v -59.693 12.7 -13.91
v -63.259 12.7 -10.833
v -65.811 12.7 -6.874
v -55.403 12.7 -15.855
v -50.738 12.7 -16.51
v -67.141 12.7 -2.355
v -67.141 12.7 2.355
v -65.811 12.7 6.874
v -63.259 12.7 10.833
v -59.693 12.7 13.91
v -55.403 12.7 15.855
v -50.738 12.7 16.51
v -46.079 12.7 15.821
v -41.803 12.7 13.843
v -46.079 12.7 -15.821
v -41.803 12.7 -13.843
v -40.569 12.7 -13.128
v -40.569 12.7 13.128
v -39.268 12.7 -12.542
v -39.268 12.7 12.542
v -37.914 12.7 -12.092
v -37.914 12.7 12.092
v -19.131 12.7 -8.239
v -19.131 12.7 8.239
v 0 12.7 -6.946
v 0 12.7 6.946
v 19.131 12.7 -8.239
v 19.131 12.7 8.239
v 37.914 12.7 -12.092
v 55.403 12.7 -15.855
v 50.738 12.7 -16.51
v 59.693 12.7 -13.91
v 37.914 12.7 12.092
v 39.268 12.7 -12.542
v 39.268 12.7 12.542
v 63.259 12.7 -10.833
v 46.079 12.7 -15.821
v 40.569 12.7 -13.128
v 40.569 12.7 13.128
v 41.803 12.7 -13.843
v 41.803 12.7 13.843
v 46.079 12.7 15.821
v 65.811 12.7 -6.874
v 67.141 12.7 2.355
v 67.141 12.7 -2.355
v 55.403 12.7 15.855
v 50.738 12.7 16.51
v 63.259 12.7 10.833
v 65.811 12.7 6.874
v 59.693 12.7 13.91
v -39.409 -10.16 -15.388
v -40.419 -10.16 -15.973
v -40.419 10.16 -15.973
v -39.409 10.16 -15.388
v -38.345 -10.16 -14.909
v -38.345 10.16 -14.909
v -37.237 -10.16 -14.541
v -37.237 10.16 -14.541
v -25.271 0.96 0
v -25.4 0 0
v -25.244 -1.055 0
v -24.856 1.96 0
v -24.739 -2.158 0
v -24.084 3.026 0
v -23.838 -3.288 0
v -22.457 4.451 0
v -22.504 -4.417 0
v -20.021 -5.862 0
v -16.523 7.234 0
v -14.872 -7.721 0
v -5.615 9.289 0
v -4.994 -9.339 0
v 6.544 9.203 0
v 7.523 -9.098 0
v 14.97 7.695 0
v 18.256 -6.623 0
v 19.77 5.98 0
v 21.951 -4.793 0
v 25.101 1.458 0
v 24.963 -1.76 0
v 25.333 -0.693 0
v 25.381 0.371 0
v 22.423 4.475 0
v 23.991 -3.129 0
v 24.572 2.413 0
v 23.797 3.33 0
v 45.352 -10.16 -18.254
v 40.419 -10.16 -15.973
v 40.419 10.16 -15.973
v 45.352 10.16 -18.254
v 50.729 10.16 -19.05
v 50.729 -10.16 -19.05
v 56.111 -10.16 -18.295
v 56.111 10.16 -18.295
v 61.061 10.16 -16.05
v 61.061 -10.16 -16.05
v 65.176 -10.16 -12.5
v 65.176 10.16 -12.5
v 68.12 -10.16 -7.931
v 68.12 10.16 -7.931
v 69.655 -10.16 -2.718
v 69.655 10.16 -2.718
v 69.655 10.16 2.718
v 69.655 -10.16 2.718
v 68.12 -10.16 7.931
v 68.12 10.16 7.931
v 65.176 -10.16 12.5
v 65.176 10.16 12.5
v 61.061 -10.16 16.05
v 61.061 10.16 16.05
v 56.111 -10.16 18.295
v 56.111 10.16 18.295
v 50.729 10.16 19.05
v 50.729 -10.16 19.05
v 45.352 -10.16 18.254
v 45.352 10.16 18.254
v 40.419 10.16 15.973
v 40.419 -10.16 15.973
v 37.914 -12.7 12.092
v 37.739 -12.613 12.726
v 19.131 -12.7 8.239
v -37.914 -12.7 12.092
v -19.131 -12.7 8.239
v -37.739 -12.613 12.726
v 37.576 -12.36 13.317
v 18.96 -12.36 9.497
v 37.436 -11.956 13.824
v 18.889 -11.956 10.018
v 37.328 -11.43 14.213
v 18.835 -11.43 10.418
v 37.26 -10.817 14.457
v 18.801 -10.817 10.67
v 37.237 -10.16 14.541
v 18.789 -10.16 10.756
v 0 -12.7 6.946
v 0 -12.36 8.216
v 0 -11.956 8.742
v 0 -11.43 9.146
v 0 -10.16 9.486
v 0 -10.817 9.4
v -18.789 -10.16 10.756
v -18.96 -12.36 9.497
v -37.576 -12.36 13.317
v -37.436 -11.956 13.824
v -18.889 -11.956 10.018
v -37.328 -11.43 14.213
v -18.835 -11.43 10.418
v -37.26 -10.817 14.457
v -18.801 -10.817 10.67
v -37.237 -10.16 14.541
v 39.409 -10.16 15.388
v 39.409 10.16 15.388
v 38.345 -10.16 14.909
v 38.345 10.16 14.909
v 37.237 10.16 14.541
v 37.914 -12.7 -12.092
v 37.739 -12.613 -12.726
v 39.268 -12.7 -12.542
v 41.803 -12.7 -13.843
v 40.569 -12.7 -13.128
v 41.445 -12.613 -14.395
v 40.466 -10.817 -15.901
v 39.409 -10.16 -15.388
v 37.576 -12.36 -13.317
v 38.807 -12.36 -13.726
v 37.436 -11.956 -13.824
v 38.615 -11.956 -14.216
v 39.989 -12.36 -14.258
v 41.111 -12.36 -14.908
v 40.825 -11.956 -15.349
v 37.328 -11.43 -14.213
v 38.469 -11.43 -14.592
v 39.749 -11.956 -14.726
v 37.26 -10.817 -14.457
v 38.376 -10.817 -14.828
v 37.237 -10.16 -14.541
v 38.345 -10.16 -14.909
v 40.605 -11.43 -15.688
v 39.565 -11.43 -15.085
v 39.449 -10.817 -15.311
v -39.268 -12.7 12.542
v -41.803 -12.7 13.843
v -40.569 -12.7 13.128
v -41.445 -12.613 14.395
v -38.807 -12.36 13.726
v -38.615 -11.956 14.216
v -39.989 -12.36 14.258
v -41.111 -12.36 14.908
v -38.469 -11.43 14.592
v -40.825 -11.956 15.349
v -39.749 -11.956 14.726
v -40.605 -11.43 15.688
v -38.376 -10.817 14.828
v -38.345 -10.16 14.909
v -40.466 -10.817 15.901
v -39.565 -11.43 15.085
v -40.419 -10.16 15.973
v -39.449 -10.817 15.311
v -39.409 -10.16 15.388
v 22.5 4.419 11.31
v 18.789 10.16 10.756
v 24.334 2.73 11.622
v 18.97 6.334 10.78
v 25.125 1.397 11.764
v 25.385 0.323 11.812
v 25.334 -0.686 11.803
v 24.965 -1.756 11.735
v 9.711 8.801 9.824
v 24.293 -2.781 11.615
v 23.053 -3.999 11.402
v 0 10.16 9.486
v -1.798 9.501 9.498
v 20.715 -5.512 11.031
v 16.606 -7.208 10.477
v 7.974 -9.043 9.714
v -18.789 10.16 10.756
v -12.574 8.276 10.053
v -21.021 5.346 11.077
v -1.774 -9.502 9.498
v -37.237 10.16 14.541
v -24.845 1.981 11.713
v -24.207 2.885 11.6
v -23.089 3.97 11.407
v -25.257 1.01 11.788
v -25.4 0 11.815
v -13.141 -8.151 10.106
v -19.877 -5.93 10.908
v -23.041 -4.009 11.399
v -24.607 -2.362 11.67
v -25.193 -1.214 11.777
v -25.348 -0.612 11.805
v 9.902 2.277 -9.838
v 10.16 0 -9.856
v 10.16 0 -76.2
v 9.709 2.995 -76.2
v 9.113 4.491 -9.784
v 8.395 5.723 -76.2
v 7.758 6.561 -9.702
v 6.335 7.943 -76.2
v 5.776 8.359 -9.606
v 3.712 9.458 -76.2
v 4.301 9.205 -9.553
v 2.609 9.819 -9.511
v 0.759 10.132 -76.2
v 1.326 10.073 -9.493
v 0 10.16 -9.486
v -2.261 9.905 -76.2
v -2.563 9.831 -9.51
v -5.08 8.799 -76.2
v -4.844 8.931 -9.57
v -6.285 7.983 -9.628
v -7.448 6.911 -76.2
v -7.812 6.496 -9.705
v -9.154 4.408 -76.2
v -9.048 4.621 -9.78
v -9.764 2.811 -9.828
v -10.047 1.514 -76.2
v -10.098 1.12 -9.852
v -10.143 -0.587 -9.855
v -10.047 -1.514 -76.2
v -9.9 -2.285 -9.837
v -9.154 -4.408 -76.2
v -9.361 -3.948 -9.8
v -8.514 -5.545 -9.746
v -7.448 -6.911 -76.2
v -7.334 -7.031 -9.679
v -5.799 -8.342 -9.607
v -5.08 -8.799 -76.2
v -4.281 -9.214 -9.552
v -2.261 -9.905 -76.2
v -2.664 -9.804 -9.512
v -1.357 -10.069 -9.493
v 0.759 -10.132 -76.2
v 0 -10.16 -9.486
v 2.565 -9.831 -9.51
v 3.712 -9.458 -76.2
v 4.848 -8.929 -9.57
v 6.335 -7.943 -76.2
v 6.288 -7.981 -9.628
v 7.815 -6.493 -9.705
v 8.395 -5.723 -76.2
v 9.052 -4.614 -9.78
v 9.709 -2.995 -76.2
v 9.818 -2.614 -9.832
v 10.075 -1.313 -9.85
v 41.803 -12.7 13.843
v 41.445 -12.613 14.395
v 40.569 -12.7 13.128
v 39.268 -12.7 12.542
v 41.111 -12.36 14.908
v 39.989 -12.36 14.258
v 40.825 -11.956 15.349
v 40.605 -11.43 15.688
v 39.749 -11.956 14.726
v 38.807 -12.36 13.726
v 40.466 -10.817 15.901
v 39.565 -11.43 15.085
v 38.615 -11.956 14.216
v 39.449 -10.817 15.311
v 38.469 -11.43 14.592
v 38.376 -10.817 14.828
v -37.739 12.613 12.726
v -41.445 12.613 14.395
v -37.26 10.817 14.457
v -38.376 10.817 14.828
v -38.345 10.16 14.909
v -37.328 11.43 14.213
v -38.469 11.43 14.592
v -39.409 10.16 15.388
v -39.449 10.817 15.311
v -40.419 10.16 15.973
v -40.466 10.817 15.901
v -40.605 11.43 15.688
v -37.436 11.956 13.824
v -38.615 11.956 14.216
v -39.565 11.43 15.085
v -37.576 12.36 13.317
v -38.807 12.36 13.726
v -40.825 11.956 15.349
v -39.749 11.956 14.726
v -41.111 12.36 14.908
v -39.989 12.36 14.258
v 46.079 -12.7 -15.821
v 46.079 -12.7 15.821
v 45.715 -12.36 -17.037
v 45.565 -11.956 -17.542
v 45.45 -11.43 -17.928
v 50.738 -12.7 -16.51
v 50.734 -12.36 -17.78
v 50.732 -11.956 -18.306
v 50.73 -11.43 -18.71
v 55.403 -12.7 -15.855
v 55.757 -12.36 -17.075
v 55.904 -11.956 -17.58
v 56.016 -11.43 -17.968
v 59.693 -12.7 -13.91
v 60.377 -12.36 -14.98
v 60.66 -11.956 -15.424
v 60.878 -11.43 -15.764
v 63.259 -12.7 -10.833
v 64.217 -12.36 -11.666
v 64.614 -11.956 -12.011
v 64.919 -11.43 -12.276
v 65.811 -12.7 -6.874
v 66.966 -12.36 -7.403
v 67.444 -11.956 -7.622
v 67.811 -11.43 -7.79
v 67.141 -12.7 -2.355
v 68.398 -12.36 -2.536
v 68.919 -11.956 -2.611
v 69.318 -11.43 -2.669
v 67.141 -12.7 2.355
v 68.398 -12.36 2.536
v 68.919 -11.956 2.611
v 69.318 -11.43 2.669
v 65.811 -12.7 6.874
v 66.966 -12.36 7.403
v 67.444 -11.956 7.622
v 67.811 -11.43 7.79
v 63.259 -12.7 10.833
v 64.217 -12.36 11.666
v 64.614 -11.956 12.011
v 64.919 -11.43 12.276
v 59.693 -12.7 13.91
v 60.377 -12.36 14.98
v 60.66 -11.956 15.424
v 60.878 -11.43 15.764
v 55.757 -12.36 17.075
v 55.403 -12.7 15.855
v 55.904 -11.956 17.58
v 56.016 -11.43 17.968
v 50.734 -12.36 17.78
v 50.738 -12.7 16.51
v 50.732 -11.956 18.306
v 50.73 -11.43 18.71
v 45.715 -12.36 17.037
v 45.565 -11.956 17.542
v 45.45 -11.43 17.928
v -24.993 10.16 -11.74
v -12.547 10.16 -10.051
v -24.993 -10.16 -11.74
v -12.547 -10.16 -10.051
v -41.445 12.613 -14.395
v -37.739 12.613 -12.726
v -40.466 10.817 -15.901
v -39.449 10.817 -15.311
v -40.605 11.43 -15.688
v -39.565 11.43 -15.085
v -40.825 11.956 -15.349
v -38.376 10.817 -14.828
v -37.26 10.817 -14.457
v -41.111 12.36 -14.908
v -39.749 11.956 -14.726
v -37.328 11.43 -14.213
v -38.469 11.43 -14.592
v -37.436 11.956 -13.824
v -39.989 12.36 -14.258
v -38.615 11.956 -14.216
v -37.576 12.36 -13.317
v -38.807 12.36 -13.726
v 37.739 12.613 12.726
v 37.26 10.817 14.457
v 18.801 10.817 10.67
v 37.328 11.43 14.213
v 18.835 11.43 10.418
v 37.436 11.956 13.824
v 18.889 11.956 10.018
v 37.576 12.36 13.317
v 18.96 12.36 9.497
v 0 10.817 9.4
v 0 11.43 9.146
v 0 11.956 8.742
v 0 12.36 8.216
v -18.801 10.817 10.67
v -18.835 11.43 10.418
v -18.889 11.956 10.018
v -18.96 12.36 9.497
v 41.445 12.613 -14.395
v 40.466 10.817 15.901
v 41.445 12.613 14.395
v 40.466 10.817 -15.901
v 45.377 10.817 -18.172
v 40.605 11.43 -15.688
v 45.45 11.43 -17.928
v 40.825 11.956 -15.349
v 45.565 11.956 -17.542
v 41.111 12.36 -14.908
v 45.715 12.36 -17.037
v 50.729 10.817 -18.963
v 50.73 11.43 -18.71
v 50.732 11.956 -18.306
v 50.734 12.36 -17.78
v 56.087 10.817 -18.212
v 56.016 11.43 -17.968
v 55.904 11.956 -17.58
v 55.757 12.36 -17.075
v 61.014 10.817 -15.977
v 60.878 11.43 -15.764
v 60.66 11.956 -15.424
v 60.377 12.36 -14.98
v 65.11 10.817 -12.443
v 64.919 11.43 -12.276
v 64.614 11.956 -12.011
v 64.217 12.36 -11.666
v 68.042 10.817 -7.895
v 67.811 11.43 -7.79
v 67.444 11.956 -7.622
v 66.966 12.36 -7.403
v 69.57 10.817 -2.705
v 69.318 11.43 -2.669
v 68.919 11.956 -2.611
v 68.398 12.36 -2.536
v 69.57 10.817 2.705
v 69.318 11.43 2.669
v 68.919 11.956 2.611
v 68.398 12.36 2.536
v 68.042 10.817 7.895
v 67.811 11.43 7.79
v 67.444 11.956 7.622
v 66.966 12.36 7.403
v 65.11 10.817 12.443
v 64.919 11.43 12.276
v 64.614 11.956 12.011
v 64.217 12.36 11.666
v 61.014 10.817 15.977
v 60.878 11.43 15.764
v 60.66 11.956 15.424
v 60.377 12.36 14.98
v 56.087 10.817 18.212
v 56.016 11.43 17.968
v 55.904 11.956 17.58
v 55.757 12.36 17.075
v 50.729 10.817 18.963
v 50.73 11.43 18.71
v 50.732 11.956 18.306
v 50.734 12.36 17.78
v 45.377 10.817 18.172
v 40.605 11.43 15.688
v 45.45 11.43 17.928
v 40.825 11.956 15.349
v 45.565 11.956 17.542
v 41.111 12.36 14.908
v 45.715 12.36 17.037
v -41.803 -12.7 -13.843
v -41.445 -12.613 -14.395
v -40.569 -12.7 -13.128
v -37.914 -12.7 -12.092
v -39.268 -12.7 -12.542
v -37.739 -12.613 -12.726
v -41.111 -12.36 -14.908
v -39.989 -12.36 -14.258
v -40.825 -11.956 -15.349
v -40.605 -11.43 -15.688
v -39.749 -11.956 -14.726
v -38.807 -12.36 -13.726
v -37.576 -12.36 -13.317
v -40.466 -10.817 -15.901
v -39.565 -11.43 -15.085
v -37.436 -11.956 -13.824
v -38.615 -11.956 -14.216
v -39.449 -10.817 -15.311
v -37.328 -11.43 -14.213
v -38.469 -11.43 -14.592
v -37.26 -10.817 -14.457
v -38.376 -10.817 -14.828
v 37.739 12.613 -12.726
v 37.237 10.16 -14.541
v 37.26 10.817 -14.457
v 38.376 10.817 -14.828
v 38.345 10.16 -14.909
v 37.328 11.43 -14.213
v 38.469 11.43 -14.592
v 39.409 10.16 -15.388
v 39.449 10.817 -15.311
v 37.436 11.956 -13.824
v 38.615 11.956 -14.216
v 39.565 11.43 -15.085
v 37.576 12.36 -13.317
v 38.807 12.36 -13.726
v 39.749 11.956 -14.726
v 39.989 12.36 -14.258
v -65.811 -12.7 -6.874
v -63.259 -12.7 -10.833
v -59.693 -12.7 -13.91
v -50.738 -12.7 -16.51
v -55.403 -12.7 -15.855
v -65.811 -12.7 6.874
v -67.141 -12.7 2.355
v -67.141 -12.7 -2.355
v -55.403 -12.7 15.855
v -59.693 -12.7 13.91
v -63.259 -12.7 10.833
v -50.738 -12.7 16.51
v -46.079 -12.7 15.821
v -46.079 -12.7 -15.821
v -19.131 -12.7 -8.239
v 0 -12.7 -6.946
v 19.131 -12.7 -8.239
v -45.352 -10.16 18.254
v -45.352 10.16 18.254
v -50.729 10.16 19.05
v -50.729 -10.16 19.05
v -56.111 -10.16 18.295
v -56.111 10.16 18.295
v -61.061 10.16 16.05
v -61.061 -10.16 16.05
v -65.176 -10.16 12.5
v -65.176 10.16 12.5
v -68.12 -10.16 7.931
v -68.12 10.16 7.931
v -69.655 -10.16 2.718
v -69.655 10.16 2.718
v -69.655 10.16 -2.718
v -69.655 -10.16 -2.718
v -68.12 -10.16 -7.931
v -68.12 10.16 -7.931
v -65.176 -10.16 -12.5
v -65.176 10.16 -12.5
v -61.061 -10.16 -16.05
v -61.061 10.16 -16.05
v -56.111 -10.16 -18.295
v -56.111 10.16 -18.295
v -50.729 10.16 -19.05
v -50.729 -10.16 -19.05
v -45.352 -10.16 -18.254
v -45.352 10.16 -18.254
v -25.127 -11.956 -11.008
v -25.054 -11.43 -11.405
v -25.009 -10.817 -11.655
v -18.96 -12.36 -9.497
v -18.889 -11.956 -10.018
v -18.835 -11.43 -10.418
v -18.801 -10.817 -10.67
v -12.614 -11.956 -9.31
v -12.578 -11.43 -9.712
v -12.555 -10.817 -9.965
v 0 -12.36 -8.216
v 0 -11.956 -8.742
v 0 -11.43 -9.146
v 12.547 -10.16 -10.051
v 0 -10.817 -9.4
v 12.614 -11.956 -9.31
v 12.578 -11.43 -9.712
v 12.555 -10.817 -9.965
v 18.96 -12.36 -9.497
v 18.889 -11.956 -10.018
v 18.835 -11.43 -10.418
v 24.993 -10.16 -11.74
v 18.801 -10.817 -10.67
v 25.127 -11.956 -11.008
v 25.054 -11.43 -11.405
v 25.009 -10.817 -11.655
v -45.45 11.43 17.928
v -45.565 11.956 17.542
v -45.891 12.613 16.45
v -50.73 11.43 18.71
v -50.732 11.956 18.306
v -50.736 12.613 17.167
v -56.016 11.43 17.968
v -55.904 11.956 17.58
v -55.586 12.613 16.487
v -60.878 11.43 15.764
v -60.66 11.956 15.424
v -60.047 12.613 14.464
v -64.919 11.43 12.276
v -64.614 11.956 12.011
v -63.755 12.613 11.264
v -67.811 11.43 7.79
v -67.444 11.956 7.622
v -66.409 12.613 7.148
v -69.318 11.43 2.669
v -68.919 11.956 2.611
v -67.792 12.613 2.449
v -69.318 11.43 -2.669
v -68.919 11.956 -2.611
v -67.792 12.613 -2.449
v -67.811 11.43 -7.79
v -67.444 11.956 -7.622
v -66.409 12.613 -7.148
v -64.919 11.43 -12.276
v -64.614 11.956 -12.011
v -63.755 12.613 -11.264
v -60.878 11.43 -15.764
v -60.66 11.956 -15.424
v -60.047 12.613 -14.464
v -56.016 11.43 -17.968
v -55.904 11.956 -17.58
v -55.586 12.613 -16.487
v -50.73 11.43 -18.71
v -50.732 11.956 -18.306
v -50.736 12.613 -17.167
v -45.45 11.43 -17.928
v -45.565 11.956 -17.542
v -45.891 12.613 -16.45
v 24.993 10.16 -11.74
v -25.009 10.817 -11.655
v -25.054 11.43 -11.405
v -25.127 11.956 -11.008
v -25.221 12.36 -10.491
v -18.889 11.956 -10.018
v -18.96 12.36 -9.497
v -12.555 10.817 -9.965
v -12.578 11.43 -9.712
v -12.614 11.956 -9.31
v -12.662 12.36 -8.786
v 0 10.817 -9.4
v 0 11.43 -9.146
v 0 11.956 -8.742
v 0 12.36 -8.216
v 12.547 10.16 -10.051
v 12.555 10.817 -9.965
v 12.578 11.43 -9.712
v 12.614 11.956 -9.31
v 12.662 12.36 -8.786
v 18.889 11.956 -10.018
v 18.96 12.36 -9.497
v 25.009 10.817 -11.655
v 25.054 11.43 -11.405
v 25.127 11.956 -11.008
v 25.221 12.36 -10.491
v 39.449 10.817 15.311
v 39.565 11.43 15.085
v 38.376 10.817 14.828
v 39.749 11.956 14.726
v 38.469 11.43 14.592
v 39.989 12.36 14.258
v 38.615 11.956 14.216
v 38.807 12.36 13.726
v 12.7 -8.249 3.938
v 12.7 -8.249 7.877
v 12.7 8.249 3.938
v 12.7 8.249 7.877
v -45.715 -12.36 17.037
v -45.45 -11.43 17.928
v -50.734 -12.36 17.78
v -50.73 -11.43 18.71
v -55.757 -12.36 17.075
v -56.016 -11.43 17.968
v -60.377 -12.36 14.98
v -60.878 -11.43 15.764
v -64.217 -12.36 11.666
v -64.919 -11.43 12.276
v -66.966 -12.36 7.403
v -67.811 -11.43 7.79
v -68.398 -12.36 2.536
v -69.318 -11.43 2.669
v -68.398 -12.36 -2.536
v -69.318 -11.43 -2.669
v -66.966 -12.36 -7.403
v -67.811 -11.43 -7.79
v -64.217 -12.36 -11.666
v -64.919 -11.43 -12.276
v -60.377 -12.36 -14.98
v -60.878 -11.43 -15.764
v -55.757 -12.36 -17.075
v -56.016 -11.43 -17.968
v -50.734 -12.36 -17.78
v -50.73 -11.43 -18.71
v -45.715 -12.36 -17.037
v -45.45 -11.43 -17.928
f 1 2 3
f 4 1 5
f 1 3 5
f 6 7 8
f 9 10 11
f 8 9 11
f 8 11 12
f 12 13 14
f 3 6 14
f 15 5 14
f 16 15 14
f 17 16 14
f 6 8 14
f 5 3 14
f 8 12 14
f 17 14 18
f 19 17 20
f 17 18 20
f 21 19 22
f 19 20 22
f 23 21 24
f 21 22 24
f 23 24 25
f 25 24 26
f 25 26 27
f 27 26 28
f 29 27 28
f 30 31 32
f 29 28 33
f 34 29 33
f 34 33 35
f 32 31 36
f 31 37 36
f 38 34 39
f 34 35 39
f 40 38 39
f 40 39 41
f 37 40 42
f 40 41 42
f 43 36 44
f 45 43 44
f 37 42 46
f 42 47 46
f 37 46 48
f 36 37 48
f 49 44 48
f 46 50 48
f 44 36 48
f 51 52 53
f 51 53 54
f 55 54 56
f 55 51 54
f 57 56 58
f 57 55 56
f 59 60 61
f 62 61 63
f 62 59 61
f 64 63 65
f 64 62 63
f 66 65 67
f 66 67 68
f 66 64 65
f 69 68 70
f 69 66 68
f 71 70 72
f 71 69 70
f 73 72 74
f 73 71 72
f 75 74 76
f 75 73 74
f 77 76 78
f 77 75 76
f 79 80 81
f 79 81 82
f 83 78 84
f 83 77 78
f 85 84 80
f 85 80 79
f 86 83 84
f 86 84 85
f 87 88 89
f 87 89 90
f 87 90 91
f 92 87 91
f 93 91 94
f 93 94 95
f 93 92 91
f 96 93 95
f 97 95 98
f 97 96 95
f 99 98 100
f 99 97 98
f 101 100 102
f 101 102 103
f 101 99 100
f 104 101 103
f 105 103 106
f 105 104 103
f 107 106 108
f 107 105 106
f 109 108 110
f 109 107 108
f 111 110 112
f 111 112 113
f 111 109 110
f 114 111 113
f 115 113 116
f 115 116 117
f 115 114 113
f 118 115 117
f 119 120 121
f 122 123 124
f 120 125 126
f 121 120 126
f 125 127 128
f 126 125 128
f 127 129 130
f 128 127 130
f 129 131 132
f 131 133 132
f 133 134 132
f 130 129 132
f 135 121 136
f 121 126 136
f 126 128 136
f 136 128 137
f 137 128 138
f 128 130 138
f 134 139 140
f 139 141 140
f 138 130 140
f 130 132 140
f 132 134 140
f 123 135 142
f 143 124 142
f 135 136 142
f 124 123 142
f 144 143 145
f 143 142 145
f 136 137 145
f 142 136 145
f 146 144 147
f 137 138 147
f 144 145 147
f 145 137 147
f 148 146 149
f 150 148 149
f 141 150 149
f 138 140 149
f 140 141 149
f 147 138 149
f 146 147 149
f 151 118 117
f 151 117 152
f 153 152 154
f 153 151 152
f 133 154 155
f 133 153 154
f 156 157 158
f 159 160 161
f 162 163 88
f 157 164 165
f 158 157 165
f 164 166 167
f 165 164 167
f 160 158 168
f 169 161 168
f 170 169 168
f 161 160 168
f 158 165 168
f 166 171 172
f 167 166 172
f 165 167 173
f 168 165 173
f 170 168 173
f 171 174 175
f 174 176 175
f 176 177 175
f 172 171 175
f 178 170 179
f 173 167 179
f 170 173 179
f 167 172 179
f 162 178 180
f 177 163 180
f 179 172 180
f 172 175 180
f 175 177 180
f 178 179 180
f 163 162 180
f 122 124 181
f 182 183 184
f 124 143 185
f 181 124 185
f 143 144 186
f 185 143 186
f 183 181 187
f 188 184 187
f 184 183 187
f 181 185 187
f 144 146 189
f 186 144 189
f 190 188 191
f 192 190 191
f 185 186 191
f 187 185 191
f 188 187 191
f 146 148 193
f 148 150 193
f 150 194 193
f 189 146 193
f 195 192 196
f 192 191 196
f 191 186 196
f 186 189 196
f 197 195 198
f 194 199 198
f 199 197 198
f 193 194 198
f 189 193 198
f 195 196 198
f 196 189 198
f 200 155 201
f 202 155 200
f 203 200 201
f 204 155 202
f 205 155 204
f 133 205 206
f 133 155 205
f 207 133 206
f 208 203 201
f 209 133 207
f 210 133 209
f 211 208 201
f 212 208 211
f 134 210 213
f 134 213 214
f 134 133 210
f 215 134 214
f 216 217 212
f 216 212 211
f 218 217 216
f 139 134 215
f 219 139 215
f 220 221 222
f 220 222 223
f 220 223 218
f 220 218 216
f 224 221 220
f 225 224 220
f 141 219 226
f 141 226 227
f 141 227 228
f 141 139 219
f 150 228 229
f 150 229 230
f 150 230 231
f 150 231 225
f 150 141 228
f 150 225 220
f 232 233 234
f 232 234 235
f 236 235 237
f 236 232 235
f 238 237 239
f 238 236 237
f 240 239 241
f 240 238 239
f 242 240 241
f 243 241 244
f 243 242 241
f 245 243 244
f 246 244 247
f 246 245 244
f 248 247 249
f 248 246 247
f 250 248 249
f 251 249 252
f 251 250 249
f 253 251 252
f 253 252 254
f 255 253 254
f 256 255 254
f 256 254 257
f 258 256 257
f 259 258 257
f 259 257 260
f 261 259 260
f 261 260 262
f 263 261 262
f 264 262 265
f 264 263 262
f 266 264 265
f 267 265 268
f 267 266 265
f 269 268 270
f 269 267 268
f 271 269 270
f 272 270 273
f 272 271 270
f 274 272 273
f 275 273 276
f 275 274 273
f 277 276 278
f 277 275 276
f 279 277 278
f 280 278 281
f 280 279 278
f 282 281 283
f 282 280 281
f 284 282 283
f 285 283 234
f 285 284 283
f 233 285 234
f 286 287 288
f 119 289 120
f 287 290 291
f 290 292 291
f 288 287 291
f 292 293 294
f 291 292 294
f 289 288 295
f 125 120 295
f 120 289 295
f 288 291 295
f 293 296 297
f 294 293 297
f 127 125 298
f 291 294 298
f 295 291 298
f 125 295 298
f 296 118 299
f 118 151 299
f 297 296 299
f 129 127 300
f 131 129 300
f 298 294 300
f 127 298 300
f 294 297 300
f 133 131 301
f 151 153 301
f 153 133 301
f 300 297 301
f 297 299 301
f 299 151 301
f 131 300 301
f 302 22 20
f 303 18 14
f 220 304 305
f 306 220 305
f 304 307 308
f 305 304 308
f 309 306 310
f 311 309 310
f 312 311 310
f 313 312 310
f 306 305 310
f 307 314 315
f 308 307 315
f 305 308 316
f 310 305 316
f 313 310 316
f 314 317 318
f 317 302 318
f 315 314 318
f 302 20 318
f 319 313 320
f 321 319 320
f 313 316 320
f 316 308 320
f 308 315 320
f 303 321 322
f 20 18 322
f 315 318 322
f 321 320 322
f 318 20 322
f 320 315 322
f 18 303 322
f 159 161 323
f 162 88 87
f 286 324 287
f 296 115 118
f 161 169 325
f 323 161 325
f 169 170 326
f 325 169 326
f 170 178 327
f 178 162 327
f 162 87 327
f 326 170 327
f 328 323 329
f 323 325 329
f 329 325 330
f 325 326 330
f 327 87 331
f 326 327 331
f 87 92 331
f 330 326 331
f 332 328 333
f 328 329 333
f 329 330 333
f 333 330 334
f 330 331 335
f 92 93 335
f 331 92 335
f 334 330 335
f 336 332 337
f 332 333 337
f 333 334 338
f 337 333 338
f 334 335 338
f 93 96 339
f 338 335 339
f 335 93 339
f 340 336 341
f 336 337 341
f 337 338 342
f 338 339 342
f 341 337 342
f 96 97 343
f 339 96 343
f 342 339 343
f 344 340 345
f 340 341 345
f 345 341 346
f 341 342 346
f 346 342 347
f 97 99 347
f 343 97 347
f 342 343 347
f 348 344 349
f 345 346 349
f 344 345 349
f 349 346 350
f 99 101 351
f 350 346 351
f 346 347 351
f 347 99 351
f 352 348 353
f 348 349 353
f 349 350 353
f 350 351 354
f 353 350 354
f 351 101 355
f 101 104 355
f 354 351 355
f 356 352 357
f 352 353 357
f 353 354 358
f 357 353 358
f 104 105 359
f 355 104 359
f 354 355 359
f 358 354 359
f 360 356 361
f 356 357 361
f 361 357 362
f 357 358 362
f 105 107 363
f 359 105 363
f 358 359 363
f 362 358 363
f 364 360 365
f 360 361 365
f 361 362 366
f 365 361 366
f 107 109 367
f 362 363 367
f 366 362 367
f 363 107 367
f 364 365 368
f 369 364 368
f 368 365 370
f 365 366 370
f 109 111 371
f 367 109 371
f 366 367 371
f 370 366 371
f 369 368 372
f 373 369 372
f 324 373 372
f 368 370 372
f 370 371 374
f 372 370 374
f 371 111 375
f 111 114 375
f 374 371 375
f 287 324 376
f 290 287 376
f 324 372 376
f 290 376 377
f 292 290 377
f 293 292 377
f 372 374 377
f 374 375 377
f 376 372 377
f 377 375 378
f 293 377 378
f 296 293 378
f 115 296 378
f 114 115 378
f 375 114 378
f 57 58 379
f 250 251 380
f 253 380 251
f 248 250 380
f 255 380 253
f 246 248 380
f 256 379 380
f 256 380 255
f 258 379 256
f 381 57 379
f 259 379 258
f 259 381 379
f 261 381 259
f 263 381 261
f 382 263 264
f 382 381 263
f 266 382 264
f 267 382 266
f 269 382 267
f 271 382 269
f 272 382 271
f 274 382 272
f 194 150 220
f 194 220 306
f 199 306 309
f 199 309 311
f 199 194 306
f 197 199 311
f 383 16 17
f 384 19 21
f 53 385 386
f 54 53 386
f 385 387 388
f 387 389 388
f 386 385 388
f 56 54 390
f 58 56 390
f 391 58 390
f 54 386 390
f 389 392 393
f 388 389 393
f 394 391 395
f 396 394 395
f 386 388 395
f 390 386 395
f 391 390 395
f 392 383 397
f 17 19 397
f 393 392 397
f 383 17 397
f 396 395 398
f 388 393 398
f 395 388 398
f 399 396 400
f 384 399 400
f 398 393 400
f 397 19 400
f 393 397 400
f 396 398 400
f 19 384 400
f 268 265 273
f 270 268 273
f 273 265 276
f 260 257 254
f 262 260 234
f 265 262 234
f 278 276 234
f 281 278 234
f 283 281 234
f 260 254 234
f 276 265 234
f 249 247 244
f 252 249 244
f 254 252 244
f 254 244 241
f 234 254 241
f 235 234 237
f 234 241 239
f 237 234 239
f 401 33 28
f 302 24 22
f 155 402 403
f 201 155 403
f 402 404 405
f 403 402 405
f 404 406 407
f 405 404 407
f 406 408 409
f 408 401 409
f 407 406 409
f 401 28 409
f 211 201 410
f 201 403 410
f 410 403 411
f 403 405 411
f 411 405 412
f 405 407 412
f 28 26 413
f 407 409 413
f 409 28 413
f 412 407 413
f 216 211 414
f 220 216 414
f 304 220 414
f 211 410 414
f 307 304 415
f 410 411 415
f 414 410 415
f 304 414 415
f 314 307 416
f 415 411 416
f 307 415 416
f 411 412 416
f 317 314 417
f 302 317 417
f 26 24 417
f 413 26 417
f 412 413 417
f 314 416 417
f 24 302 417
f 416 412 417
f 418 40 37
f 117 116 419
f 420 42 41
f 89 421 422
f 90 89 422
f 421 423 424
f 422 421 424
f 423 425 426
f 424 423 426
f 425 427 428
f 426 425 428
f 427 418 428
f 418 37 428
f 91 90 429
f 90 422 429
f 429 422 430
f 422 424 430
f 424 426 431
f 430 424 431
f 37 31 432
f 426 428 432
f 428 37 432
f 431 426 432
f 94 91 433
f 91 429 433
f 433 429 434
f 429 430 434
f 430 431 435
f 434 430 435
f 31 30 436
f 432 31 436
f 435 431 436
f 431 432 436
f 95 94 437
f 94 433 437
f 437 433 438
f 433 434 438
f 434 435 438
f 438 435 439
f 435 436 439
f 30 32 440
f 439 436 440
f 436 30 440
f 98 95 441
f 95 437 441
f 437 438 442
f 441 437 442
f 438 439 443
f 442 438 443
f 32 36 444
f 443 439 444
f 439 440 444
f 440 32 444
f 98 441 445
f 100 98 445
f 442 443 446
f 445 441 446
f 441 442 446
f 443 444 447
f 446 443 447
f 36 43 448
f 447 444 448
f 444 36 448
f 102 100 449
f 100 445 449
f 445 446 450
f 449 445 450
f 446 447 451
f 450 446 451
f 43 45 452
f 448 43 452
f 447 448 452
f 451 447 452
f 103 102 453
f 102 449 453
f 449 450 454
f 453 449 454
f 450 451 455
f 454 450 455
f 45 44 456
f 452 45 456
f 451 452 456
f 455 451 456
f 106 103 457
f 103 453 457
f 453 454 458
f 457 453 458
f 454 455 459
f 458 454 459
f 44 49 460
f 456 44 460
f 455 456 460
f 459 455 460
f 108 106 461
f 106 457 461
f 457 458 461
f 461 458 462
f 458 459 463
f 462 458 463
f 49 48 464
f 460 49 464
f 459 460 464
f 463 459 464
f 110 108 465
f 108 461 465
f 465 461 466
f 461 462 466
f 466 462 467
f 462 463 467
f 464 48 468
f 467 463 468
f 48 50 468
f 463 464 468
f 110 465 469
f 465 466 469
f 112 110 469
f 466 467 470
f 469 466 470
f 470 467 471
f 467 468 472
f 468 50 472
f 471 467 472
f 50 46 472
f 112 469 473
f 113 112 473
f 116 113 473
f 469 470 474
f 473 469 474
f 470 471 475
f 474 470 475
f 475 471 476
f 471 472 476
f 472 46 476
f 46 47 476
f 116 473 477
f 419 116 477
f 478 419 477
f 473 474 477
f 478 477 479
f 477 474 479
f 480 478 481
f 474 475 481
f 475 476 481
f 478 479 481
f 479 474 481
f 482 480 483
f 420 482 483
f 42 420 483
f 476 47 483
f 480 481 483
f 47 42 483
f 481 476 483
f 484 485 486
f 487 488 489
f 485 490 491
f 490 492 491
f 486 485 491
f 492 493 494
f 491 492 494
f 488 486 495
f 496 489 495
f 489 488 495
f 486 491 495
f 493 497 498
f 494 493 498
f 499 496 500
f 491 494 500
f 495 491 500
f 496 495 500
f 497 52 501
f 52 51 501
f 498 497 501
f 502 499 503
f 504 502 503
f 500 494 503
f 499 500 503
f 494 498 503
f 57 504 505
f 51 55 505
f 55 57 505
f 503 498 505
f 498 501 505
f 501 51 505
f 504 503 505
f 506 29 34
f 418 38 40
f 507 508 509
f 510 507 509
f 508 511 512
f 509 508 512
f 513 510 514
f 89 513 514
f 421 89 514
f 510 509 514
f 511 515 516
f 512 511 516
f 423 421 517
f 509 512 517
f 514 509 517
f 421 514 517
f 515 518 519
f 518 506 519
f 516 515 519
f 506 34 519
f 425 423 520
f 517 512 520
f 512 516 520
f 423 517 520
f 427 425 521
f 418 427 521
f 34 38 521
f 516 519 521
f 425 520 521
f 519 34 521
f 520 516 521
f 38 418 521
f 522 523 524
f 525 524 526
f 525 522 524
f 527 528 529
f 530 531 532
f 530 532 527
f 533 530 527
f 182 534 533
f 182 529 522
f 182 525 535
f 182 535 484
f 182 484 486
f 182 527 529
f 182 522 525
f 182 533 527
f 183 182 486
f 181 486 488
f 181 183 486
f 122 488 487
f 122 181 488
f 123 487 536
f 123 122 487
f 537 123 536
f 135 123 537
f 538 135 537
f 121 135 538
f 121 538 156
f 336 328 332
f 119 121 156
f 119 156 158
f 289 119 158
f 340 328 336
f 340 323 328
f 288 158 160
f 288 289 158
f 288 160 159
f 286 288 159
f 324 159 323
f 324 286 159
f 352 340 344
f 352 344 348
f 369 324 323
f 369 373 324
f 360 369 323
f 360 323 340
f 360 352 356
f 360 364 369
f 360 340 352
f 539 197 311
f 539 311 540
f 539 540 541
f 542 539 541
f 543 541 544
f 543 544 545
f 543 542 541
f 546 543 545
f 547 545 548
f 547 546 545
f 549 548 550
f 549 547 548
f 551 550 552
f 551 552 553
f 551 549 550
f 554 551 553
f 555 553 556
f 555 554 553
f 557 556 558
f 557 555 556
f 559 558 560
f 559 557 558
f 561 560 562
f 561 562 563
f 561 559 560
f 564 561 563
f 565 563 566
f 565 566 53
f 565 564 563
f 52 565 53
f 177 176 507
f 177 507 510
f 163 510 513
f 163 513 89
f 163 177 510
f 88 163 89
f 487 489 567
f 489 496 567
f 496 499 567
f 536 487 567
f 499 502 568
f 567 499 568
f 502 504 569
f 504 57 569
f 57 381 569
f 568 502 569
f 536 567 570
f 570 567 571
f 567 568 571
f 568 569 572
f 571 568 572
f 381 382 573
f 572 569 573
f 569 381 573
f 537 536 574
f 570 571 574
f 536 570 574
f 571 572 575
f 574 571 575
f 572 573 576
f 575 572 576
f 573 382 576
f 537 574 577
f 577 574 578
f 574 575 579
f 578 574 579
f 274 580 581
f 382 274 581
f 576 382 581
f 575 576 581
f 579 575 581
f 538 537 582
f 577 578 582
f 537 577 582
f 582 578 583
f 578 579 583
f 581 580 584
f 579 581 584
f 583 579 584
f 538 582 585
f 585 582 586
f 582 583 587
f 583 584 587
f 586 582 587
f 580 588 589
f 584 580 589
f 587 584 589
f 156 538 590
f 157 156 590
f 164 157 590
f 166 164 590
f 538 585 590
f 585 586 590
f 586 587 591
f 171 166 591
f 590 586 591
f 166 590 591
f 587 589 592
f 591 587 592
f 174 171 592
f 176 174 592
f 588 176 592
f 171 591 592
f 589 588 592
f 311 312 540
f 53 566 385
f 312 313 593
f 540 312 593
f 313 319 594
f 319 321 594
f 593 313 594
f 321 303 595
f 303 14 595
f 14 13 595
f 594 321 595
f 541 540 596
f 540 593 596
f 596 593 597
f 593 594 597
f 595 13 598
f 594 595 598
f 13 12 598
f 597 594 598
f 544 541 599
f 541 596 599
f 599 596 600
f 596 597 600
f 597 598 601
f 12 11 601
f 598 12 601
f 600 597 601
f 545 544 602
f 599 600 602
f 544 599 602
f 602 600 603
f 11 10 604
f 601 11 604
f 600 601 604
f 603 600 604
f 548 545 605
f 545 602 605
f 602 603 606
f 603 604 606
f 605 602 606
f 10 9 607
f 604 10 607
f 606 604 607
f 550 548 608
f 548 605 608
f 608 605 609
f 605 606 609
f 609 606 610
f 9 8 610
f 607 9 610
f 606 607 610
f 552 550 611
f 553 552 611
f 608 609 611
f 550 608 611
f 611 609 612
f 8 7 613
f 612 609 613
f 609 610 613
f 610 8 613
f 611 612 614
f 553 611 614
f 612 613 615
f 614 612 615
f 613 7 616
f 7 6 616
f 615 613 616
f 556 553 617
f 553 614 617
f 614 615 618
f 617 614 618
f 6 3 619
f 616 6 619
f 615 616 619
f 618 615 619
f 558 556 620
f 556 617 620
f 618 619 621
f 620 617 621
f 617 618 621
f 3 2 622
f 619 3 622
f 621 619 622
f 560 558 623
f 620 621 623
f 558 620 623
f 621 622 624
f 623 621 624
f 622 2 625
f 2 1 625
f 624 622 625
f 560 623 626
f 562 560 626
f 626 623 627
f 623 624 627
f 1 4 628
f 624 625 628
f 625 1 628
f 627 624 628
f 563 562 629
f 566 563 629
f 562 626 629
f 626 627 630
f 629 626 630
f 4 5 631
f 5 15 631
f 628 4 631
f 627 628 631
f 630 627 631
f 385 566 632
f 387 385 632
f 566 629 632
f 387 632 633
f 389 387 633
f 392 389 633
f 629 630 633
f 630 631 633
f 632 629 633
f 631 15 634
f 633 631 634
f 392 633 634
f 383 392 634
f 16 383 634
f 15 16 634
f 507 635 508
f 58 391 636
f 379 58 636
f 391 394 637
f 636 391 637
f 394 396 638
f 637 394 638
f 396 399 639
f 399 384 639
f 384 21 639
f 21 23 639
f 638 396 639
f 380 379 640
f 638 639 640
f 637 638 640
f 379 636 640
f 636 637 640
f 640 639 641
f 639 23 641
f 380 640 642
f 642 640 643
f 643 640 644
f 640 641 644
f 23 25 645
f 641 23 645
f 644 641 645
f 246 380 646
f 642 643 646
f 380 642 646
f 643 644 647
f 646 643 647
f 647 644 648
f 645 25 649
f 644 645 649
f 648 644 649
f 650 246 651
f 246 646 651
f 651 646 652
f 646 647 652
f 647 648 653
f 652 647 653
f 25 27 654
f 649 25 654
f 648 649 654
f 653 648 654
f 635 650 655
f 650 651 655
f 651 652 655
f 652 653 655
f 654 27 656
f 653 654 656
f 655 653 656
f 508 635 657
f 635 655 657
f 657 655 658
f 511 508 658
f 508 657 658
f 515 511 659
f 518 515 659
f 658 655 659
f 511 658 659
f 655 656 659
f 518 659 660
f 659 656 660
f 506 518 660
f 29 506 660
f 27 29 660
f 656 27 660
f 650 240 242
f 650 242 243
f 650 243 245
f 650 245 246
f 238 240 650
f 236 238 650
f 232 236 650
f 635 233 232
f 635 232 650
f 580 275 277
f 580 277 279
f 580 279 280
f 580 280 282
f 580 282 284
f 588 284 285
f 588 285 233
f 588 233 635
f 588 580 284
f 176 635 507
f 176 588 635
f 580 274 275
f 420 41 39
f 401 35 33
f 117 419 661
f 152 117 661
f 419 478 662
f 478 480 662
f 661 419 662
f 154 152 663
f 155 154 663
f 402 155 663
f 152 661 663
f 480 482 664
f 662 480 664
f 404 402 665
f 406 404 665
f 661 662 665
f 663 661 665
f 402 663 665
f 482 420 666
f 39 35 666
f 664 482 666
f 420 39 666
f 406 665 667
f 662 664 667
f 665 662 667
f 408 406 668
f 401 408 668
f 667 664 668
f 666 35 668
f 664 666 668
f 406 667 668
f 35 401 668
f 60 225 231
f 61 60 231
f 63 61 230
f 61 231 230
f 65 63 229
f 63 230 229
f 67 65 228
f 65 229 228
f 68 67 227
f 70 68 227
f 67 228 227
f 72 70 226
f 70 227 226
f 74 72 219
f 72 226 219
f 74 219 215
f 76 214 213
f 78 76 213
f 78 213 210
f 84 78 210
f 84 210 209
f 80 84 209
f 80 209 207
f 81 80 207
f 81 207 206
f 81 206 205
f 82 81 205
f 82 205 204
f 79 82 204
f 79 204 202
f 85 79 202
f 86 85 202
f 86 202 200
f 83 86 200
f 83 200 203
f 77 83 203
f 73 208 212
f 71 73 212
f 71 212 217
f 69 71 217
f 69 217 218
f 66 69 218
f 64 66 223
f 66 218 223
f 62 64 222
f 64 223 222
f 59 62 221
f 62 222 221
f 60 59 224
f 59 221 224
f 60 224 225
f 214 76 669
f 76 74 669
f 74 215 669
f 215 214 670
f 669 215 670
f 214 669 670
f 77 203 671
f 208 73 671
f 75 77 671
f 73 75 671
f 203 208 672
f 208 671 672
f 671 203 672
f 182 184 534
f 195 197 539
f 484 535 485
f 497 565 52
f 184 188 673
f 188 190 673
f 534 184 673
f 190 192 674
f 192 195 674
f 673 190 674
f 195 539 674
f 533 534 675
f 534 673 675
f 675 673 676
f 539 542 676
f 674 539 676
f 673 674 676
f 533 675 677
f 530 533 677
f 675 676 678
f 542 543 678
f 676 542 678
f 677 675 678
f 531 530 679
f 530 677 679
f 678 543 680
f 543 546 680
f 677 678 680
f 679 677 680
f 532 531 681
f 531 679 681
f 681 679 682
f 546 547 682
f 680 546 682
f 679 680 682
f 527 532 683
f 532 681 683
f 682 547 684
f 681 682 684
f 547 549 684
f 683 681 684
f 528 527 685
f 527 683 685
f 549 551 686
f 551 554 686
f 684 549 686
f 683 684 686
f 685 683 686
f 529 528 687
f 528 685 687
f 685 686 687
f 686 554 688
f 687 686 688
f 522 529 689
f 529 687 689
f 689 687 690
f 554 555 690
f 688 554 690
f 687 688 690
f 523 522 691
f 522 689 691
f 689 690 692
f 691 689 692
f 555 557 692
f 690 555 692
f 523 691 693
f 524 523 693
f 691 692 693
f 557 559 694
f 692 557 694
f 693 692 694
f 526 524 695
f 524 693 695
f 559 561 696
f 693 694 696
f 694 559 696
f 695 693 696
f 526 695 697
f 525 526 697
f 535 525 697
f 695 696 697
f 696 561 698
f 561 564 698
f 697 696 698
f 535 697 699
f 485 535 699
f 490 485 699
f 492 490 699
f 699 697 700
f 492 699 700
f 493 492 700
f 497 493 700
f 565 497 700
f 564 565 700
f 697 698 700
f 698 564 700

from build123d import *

# Parameters (mm, degrees)
F1_DEPTH = 12.7
F2_R     = 2.54
F3_R     = 10.16
F4_DEPTH = 76.2
F7_DEPTH = 19.05


with BuildPart() as f1:
    # F0 (on Front) → F1 (new body, symmetric)
    with BuildSketch(Plane.XZ):
        with BuildLine():
            ThreePointArc((-37.237423, 14.540576), (-38.883304, 15.134729), (-40.419203, 15.973151))
            ThreePointArc((-40.419203, 15.973151), (-69.85, 0), (-40.419203, -15.973151))
            ThreePointArc((-40.419203, -15.973151), (-38.883304, -15.134729), (-37.237423, -14.540576))
            ThreePointArc((-37.237423, -14.540576), (0, -9.486275), (37.237423, -14.540576))
            ThreePointArc((37.237423, -14.540576), (38.883304, -15.134729), (40.419203, -15.973151))
            ThreePointArc((40.419203, -15.973151), (69.85, 0), (40.419203, 15.973151))
            ThreePointArc((40.419203, 15.973151), (38.883304, 15.134729), (37.237423, 14.540576))
            ThreePointArc((37.237423, 14.540576), (0, 9.486275), (-37.237423, 14.540576))
        make_face()
    extrude(amount=F1_DEPTH, both=True)

    # F2
    f2_edges = [f1.edges().sort_by_distance(p)[0] for p in [
        (-69.85, -12.7, 0),
        (-69.85, 12.7, 0),
    ]]
    fillet(f2_edges, radius=F2_R)

    # F3 (on Top) → F4 (join)
    with BuildSketch(Plane.XY):
        Circle(F3_R)
    extrude(amount=-F4_DEPTH)

    # F6 (on offset) → F7 (cut)
    with BuildSketch(Plane.XY.offset(19.05)):
        with BuildLine():
            add(Edge.make_bspline(
                [(-25.4, 0), (-25.4, -16.497784), (12.7, -8.248892), (50.8, 0), (12.7, 8.248892), (-25.4, 16.497784), (-25.4, 0)],
                knots=[0, 0, 0, 2.094395, 2.094395, 4.18879, 4.18879, 6.283185, 6.283185, 6.283185], degree=2, weights=[1, 0.5, 1, 0.5, 1, 0.5, 1]))
        make_face()
    extrude(amount=-F7_DEPTH, mode=Mode.SUBTRACT)


solid = f1.part
